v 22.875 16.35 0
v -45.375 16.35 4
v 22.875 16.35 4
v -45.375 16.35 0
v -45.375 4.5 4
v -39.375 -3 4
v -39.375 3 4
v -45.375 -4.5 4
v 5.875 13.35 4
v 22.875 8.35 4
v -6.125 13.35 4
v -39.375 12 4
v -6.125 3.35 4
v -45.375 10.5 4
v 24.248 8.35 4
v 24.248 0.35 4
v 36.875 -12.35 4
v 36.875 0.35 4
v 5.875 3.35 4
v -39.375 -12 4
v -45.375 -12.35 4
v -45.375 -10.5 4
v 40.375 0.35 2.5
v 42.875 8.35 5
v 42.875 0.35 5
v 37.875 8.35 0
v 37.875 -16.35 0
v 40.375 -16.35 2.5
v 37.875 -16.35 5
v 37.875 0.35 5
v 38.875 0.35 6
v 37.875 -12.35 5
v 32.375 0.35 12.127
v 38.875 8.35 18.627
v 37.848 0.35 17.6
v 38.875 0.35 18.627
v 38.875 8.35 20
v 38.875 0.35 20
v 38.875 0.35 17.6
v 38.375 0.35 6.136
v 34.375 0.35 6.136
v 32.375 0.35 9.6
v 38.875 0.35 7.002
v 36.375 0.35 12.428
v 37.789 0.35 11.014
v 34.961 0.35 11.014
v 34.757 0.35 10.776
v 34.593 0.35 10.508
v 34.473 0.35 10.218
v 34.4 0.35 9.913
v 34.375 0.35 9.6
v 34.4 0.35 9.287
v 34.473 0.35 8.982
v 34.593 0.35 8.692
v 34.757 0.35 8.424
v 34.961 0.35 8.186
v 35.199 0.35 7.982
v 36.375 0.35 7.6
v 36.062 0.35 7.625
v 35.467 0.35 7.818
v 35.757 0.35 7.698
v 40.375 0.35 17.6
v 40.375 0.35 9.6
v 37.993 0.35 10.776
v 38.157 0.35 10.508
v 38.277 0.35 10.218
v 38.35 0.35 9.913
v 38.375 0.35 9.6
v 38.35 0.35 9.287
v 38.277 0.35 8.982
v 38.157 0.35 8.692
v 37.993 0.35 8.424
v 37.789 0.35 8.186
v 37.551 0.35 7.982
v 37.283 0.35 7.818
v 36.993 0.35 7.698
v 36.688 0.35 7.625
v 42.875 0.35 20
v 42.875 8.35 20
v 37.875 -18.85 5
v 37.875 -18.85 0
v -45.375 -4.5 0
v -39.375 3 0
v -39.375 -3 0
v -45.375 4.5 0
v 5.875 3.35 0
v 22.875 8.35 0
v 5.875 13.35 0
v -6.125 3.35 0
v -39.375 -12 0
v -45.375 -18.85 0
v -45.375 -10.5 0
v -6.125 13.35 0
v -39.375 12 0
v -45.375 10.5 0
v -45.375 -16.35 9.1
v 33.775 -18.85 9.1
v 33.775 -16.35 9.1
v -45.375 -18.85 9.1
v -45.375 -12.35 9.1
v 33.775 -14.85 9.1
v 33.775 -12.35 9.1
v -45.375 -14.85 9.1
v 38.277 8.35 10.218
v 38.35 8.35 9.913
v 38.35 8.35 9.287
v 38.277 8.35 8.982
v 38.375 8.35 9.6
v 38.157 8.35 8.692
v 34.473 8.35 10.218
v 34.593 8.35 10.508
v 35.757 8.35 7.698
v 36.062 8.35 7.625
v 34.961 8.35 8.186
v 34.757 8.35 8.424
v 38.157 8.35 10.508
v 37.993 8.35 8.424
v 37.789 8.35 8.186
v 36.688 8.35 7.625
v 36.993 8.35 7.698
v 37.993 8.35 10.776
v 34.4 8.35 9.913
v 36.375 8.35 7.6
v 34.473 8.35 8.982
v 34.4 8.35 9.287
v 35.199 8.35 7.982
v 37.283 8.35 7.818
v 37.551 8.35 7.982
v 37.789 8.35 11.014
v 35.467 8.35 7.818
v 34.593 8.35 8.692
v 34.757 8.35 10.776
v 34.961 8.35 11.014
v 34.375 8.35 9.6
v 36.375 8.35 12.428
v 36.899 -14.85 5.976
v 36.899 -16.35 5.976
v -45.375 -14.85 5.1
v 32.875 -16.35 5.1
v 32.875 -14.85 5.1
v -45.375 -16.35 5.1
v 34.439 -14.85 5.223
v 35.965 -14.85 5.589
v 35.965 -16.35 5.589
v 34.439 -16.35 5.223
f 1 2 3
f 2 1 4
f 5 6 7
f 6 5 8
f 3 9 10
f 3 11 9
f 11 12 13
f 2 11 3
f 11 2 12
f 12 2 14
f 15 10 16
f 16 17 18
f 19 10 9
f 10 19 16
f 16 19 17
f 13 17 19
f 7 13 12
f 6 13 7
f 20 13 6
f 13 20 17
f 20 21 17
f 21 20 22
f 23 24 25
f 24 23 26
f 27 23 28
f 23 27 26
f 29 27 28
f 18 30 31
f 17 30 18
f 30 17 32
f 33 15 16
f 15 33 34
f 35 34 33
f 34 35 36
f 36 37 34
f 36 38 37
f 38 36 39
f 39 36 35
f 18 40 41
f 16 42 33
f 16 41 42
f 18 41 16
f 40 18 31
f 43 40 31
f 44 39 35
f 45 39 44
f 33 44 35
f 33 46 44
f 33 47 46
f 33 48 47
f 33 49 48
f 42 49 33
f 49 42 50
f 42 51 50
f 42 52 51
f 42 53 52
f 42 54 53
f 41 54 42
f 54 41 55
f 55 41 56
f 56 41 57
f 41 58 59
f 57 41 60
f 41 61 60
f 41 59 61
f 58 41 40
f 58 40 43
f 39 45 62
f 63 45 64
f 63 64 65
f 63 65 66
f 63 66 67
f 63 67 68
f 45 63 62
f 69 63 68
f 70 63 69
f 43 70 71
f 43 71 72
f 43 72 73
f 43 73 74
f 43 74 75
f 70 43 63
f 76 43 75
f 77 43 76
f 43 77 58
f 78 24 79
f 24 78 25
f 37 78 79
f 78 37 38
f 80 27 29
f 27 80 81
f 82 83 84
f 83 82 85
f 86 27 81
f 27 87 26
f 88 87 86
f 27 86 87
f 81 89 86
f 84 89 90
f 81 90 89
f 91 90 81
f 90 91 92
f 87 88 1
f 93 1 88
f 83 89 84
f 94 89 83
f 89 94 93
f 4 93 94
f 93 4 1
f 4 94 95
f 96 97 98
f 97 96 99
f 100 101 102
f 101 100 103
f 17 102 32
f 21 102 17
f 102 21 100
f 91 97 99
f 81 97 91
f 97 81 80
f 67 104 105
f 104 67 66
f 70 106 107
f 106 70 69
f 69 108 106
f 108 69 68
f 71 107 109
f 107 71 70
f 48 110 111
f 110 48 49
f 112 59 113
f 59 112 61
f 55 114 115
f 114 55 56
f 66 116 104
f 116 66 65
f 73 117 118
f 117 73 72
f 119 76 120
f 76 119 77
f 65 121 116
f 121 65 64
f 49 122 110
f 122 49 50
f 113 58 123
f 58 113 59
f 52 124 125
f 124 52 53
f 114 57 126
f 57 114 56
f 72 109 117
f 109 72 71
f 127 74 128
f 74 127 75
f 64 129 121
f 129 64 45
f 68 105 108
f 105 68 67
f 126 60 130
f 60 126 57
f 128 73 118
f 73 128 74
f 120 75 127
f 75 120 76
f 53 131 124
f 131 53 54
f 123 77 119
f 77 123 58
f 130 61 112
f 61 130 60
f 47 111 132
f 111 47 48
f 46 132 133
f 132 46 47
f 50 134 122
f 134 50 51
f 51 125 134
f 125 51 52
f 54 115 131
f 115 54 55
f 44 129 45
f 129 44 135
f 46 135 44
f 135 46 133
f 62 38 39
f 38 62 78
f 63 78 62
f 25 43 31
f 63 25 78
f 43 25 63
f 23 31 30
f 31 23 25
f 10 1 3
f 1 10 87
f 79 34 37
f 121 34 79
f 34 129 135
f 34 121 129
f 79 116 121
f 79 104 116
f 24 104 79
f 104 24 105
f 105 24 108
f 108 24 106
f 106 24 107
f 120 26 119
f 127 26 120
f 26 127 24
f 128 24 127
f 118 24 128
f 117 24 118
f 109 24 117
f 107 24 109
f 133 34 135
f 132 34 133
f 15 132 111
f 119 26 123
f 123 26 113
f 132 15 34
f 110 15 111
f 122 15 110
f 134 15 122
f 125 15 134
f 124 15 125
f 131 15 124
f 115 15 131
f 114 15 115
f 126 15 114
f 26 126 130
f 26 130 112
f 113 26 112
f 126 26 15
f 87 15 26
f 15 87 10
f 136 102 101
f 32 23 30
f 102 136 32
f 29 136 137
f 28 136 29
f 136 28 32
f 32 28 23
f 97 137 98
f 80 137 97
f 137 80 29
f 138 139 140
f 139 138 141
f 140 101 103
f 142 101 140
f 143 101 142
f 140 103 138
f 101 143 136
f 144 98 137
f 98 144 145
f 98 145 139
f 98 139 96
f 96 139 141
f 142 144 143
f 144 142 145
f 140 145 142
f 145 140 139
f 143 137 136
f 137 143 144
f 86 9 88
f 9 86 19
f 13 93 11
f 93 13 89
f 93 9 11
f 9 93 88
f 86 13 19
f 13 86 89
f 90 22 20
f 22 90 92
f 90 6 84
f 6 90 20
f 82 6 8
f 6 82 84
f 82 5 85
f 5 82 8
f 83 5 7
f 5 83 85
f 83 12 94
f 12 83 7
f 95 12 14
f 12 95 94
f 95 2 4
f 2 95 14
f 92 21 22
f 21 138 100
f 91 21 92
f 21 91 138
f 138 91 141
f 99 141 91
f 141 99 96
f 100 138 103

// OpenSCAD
// file: _ittybox.scad
include <_constants.scad>

module panel(wall_thickness, side=false) {
	bolt_x = side ? bolt_offset_y : bolt_offset_x;
	bolt_z = side ? bolt_offset_x : bolt_offset_y;
	width = side ? panel_depth : panel_width;
	overlap_cutout_potition = side ? end_corner_height : -end_corner_height;
	overlap_cutout_size = side ? end_corner_height*2 : end_corner_height;

	difference() {
		union() {
			// Main panel
			translate([0, 0, wall_thickness/2]) {
				cube([width - corner_radius*2, height, wall_thickness], center=true);
			}

			for (x = [-1, 1]) {
				// Rounded corner
				translate([x*(width/2 - corner_radius), 0, corner_radius]) {
					r = corner_radius;
					rotate([90, 0, 0]) {
						intersection() {
							cylinder(height, r=r, center=true, $fn=4);
							mirror([x > 0 ? 1 : 0, 0, 0]) translate([0, 0, -height/2]) {
								linear_extrude(height=height) polygon([[-r, r], [-r, -r], [r, -r]]);
							}
						}
					}
				}
				overlap_length = corner_overlap - corner_radius;

				// Overlap side
				translate([x*(width/2 - wall_thickness/2), 0, corner_radius + overlap_length/2]) {
					cube([wall_thickness, height, overlap_length], center=true);
				}

				// Corner chamfer
				translate([x*(width/2), height/2 - end_corner_height*2, 0]) {
					mirror([x > 0 ? 1 : 0, 0, 0])
					intersection() {
						rotate([0, 45, 0]) cube([corner_chamfer*2, height*2, corner_chamfer*2], center=true);
						translate([wall_thickness, 0, wall_thickness]) {
							cube([width/2, end_corner_height*2, corner_overlap - wall_thickness], center=false);
						}
					}
				}
			}

			if (side) {
				// Plexi support
				support_height = (panel_width - plexi_width)/2 + 4;
				support_depth = plexi_thickness + 5;
				translate([0, -height/2 + plexi_thickness/2, support_height/2]) {
					cube([width - corner_radius*2, support_depth, support_height], center=true);
				}
			}
		}

		for (x = [-1, 1]) {
			// Bolt hole
			translate([x*(width/2 - bolt_x), height/2 - end_corner_height*2, bolt_z]) {
				rotate([-90, 0, 0]) cylinder(height, d=bolt_diameter, center=false);
				rotate([0, -45, 0]) cube([bolt_diameter/2, height, bolt_diameter/2], center=false);
				bolt_depression = bolt_nut_thickness/2;
				rotate([90, 0, 0]) cylinder(bolt_nut_clearance, d=bolt_nut_width, center=false, $fn=6);
				mirror([0, 1, 0]) translate([-bolt_nut_width/2, 0, 0]) cube([bolt_nut_width, bolt_nut_clearance, bolt_nut_width], center=false);
			}

			// Overlap cutout
			translate([x*(width/2), height/2 + overlap_cutout_potition - overlap_cutout_size/2, 0]) {
				cube([corner_overlap*2, overlap_cutout_size, corner_overlap*4], center=true);
			}

			// Diagonal corner cut
			translate([x*(width/2), height/2 - end_corner_height*2, 0]) {
				mirror([0, 1, 0]) rotate([0, -45, 0]) cube([width, height, width], center=false);
			}
		}
	}
}

module plexi_hole() {
	hull() {
		translate([
			-plexi_width/2 + plexi_hole_offset_x + plexi_hole_diameter/2,
			-plexi_depth/2 + plexi_hole_offset_y + plexi_hole_diameter/2,
			0,
		]) {
			cylinder(plexi_thickness*2, d=plexi_hole_diameter, center=true);
			translate([0, plexi_hole_length - plexi_hole_diameter, 0]) cylinder(plexi_thickness*2, d=plexi_hole_diameter, center=true);
		}
	}
}

module plexi() {
	difference() {
		translate([0, 0, plexi_thickness/2]) {
			minkowski() {
				cube([
					plexi_width - plexi_corner_radius*2,
					plexi_depth - plexi_corner_radius*2,
					plexi_thickness/2,
				], center=true);
				cylinder(plexi_thickness/2, r=plexi_corner_radius, center=true);
			}
		}
		// plexi_hole();
		// mirror([0, 1, 0]) plexi_hole();
		// mirror([1, 0, 0]) plexi_hole();
		// rotate([0, 0, 180]) plexi_hole();
	}
}

module end_panel(wall_thickness) {
	difference() {
		panel(wall_thickness, side=false);
		translate([0, -height/2, panel_depth/2]) rotate([-90, 0, 0]) plexi();
	}
}

module side_panel(wall_thickness) {
	difference() {
		panel(wall_thickness, side=true);
		translate([0, -height/2, panel_width/2]) rotate([-90, 90, 0]) plexi();
	}
}

module button_hole() {
	cylinder(button_panel_thickness*3, d=button_diameter, center=true);
	translate([0, 0, button_panel_thickness])
		cylinder(button_panel_thickness*2, d=button_tab_diameter, center=false);
}

module back_panel() {
	wall_thickness = 6;
	difference() {
		end_panel(wall_thickness);

		// USB port panel
		translate([0, height/2 - usb_panel_board_pos_y, 0]) {
			cube([usb_panel_width, usb_panel_board_thickness, wall_thickness*3], center=true);
		}
		translate([0, height/2 - usb_panel_height/2, 0]) {
			cube([usb_panel_inner_width, usb_panel_inner_height, wall_thickness*3], center=true);
			screw_x = usb_panel_width/2 - usb_panel_hole_offset;
			screw_y = usb_panel_height/2 - usb_panel_hole_offset;
			for (xy = [ [screw_x, screw_y], [-screw_x, -screw_y] ]) {
				translate([each xy, 0]) {
					cylinder(wall_thickness*3, d=usb_panel_hole_diameter, center=true);
				}
			}
		}

		// Button holes
		translate([0, height/2 - usb_panel_height/2, 0]) {
			offset = usb_panel_width/2;
			for (x = [
				-(offset + button_spacing*2),
				-(offset + button_spacing),
				(offset + button_spacing),
				(offset + button_spacing*2),
			]) {
				translate([x, 0, 0]) {
					button_hole();
				}
			}
		}
	}
}

module front_panel() {
	end_panel(4);
}

module left_panel() {
	side_panel(4);
}

module right_panel() {
	wall_thickness = 4;
	switch_offset_x = panel_depth - 43;
	switch_offset_y = 8;
	difference() {
		side_panel(wall_thickness);
		translate([-panel_depth/2 + switch_offset_x, height/2 - switch_offset_y, 0]) {
			cube([12, 10, wall_thickness*3], center=true);
		}
	}
}

module panel_joint() {
	joint_inner = 6;
	joint_outer = 9;
	joint_length = 6;
	spacing = (joint_inner + joint_outer)/2;
	translate([-joint_length/2, 0, -corner_overlap])
	linear_extrude(height=corner_overlap*3)
	polygon([
		[0, height],
		[-panel_width, height],
		[-panel_width, -height],
		[0, -height],
		[0, -spacing - joint_inner/2],
		[joint_length, -spacing - joint_outer/2],
		[joint_length, -spacing + joint_outer/2],
		[0, -spacing + joint_inner/2],
		[0, spacing - joint_inner/2],
		[joint_length, spacing - joint_outer/2],
		[joint_length, spacing + joint_outer/2],
		[0, spacing + joint_inner/2],
	]);
}

module panel_split() {
  translate([0, -height, -corner_overlap*2])
  mirror([1, 0, 0])
  cube([panel_width, height*2, corner_overlap*4]);
}

back_panel();
translate([0, height*1.5, 0]) front_panel();
translate([0, height*-1.5, 0]) right_panel();
translate([0, height*-3, 0]) left_panel();
// file: _constants.scad
$fn = 40;

// AllFightSticks 9.5" Button Panel - Stickless
// https://allfightsticks.com/collections/9-5-enclosures/products/9-5-button-panel?variant=21327143141455
panel_width = 228.2;
panel_depth = 171.5;
bolt_offset_x = 9.6; // distance to center of hole
bolt_offset_y = 6.5; // distance to center of hole
corner_radius = 5;

// FocusAttack Blank Plexi Cover for AllFightSticks 9.5" Solid Bottom Panel
// https://focusattack.com/blank-plexi-cover-for-allfightsticks-9-5-solid-bottom-panel/
plexi_width = 218;
plexi_depth = panel_depth;
plexi_thickness = 1.5;
plexi_hole_offset_x = 11.1; // distance to edge
plexi_hole_offset_y = 8.85; // distance to edge
plexi_hole_diameter = 8;
plexi_hole_length = 14;
plexi_corner_radius = 10;

// Sanwa SDM-18 buttons
// https://paradisearcadeshop.com/home/controls/buttons/sanwa/358-sanwa-sdm-series
button_diameter = 18;
button_tab_diameter = 24;
button_panel_thickness = 3;

// Brook Wireless Fighting Board
// https://www.brookaccessory.com/detail/41130595/
usb_panel_width = 26;
usb_panel_height = 31.2;
usb_panel_depth = 1.6;
usb_panel_hole_offset = 3.5; // from top/side edge
usb_panel_hole_diameter = 3; // M3
usb_panel_board_thickness = 1.65; // horizontal board
usb_panel_board_pos_y = 17.6; // from top
usb_panel_inner_width = 12; // USB connector housing
usb_panel_inner_height = 20; // USB connector housing/3.5mm jack

// M4 x 20mm internal hex button-head screw
bolt_diameter = 4;
bolt_length = 20;
bolt_nut_thickness = 3.2;
bolt_nut_width = 8; // outer
bolt_nut_clearance = 10;

height = usb_panel_height + plexi_thickness;
corner_overlap = 20;
end_corner_height = 8;
corner_chamfer = 16;
button_spacing = button_tab_diameter*1.2;
joint_offset = 0.5; // Accounts for extra length added by joint
// main file
include <_constants.scad>
use <_ittybox.scad>;

translate([-panel_depth/4, 0, 0])
difference() {
  right_panel();
  translate([joint_offset, 0, 0]) panel_joint();
}
